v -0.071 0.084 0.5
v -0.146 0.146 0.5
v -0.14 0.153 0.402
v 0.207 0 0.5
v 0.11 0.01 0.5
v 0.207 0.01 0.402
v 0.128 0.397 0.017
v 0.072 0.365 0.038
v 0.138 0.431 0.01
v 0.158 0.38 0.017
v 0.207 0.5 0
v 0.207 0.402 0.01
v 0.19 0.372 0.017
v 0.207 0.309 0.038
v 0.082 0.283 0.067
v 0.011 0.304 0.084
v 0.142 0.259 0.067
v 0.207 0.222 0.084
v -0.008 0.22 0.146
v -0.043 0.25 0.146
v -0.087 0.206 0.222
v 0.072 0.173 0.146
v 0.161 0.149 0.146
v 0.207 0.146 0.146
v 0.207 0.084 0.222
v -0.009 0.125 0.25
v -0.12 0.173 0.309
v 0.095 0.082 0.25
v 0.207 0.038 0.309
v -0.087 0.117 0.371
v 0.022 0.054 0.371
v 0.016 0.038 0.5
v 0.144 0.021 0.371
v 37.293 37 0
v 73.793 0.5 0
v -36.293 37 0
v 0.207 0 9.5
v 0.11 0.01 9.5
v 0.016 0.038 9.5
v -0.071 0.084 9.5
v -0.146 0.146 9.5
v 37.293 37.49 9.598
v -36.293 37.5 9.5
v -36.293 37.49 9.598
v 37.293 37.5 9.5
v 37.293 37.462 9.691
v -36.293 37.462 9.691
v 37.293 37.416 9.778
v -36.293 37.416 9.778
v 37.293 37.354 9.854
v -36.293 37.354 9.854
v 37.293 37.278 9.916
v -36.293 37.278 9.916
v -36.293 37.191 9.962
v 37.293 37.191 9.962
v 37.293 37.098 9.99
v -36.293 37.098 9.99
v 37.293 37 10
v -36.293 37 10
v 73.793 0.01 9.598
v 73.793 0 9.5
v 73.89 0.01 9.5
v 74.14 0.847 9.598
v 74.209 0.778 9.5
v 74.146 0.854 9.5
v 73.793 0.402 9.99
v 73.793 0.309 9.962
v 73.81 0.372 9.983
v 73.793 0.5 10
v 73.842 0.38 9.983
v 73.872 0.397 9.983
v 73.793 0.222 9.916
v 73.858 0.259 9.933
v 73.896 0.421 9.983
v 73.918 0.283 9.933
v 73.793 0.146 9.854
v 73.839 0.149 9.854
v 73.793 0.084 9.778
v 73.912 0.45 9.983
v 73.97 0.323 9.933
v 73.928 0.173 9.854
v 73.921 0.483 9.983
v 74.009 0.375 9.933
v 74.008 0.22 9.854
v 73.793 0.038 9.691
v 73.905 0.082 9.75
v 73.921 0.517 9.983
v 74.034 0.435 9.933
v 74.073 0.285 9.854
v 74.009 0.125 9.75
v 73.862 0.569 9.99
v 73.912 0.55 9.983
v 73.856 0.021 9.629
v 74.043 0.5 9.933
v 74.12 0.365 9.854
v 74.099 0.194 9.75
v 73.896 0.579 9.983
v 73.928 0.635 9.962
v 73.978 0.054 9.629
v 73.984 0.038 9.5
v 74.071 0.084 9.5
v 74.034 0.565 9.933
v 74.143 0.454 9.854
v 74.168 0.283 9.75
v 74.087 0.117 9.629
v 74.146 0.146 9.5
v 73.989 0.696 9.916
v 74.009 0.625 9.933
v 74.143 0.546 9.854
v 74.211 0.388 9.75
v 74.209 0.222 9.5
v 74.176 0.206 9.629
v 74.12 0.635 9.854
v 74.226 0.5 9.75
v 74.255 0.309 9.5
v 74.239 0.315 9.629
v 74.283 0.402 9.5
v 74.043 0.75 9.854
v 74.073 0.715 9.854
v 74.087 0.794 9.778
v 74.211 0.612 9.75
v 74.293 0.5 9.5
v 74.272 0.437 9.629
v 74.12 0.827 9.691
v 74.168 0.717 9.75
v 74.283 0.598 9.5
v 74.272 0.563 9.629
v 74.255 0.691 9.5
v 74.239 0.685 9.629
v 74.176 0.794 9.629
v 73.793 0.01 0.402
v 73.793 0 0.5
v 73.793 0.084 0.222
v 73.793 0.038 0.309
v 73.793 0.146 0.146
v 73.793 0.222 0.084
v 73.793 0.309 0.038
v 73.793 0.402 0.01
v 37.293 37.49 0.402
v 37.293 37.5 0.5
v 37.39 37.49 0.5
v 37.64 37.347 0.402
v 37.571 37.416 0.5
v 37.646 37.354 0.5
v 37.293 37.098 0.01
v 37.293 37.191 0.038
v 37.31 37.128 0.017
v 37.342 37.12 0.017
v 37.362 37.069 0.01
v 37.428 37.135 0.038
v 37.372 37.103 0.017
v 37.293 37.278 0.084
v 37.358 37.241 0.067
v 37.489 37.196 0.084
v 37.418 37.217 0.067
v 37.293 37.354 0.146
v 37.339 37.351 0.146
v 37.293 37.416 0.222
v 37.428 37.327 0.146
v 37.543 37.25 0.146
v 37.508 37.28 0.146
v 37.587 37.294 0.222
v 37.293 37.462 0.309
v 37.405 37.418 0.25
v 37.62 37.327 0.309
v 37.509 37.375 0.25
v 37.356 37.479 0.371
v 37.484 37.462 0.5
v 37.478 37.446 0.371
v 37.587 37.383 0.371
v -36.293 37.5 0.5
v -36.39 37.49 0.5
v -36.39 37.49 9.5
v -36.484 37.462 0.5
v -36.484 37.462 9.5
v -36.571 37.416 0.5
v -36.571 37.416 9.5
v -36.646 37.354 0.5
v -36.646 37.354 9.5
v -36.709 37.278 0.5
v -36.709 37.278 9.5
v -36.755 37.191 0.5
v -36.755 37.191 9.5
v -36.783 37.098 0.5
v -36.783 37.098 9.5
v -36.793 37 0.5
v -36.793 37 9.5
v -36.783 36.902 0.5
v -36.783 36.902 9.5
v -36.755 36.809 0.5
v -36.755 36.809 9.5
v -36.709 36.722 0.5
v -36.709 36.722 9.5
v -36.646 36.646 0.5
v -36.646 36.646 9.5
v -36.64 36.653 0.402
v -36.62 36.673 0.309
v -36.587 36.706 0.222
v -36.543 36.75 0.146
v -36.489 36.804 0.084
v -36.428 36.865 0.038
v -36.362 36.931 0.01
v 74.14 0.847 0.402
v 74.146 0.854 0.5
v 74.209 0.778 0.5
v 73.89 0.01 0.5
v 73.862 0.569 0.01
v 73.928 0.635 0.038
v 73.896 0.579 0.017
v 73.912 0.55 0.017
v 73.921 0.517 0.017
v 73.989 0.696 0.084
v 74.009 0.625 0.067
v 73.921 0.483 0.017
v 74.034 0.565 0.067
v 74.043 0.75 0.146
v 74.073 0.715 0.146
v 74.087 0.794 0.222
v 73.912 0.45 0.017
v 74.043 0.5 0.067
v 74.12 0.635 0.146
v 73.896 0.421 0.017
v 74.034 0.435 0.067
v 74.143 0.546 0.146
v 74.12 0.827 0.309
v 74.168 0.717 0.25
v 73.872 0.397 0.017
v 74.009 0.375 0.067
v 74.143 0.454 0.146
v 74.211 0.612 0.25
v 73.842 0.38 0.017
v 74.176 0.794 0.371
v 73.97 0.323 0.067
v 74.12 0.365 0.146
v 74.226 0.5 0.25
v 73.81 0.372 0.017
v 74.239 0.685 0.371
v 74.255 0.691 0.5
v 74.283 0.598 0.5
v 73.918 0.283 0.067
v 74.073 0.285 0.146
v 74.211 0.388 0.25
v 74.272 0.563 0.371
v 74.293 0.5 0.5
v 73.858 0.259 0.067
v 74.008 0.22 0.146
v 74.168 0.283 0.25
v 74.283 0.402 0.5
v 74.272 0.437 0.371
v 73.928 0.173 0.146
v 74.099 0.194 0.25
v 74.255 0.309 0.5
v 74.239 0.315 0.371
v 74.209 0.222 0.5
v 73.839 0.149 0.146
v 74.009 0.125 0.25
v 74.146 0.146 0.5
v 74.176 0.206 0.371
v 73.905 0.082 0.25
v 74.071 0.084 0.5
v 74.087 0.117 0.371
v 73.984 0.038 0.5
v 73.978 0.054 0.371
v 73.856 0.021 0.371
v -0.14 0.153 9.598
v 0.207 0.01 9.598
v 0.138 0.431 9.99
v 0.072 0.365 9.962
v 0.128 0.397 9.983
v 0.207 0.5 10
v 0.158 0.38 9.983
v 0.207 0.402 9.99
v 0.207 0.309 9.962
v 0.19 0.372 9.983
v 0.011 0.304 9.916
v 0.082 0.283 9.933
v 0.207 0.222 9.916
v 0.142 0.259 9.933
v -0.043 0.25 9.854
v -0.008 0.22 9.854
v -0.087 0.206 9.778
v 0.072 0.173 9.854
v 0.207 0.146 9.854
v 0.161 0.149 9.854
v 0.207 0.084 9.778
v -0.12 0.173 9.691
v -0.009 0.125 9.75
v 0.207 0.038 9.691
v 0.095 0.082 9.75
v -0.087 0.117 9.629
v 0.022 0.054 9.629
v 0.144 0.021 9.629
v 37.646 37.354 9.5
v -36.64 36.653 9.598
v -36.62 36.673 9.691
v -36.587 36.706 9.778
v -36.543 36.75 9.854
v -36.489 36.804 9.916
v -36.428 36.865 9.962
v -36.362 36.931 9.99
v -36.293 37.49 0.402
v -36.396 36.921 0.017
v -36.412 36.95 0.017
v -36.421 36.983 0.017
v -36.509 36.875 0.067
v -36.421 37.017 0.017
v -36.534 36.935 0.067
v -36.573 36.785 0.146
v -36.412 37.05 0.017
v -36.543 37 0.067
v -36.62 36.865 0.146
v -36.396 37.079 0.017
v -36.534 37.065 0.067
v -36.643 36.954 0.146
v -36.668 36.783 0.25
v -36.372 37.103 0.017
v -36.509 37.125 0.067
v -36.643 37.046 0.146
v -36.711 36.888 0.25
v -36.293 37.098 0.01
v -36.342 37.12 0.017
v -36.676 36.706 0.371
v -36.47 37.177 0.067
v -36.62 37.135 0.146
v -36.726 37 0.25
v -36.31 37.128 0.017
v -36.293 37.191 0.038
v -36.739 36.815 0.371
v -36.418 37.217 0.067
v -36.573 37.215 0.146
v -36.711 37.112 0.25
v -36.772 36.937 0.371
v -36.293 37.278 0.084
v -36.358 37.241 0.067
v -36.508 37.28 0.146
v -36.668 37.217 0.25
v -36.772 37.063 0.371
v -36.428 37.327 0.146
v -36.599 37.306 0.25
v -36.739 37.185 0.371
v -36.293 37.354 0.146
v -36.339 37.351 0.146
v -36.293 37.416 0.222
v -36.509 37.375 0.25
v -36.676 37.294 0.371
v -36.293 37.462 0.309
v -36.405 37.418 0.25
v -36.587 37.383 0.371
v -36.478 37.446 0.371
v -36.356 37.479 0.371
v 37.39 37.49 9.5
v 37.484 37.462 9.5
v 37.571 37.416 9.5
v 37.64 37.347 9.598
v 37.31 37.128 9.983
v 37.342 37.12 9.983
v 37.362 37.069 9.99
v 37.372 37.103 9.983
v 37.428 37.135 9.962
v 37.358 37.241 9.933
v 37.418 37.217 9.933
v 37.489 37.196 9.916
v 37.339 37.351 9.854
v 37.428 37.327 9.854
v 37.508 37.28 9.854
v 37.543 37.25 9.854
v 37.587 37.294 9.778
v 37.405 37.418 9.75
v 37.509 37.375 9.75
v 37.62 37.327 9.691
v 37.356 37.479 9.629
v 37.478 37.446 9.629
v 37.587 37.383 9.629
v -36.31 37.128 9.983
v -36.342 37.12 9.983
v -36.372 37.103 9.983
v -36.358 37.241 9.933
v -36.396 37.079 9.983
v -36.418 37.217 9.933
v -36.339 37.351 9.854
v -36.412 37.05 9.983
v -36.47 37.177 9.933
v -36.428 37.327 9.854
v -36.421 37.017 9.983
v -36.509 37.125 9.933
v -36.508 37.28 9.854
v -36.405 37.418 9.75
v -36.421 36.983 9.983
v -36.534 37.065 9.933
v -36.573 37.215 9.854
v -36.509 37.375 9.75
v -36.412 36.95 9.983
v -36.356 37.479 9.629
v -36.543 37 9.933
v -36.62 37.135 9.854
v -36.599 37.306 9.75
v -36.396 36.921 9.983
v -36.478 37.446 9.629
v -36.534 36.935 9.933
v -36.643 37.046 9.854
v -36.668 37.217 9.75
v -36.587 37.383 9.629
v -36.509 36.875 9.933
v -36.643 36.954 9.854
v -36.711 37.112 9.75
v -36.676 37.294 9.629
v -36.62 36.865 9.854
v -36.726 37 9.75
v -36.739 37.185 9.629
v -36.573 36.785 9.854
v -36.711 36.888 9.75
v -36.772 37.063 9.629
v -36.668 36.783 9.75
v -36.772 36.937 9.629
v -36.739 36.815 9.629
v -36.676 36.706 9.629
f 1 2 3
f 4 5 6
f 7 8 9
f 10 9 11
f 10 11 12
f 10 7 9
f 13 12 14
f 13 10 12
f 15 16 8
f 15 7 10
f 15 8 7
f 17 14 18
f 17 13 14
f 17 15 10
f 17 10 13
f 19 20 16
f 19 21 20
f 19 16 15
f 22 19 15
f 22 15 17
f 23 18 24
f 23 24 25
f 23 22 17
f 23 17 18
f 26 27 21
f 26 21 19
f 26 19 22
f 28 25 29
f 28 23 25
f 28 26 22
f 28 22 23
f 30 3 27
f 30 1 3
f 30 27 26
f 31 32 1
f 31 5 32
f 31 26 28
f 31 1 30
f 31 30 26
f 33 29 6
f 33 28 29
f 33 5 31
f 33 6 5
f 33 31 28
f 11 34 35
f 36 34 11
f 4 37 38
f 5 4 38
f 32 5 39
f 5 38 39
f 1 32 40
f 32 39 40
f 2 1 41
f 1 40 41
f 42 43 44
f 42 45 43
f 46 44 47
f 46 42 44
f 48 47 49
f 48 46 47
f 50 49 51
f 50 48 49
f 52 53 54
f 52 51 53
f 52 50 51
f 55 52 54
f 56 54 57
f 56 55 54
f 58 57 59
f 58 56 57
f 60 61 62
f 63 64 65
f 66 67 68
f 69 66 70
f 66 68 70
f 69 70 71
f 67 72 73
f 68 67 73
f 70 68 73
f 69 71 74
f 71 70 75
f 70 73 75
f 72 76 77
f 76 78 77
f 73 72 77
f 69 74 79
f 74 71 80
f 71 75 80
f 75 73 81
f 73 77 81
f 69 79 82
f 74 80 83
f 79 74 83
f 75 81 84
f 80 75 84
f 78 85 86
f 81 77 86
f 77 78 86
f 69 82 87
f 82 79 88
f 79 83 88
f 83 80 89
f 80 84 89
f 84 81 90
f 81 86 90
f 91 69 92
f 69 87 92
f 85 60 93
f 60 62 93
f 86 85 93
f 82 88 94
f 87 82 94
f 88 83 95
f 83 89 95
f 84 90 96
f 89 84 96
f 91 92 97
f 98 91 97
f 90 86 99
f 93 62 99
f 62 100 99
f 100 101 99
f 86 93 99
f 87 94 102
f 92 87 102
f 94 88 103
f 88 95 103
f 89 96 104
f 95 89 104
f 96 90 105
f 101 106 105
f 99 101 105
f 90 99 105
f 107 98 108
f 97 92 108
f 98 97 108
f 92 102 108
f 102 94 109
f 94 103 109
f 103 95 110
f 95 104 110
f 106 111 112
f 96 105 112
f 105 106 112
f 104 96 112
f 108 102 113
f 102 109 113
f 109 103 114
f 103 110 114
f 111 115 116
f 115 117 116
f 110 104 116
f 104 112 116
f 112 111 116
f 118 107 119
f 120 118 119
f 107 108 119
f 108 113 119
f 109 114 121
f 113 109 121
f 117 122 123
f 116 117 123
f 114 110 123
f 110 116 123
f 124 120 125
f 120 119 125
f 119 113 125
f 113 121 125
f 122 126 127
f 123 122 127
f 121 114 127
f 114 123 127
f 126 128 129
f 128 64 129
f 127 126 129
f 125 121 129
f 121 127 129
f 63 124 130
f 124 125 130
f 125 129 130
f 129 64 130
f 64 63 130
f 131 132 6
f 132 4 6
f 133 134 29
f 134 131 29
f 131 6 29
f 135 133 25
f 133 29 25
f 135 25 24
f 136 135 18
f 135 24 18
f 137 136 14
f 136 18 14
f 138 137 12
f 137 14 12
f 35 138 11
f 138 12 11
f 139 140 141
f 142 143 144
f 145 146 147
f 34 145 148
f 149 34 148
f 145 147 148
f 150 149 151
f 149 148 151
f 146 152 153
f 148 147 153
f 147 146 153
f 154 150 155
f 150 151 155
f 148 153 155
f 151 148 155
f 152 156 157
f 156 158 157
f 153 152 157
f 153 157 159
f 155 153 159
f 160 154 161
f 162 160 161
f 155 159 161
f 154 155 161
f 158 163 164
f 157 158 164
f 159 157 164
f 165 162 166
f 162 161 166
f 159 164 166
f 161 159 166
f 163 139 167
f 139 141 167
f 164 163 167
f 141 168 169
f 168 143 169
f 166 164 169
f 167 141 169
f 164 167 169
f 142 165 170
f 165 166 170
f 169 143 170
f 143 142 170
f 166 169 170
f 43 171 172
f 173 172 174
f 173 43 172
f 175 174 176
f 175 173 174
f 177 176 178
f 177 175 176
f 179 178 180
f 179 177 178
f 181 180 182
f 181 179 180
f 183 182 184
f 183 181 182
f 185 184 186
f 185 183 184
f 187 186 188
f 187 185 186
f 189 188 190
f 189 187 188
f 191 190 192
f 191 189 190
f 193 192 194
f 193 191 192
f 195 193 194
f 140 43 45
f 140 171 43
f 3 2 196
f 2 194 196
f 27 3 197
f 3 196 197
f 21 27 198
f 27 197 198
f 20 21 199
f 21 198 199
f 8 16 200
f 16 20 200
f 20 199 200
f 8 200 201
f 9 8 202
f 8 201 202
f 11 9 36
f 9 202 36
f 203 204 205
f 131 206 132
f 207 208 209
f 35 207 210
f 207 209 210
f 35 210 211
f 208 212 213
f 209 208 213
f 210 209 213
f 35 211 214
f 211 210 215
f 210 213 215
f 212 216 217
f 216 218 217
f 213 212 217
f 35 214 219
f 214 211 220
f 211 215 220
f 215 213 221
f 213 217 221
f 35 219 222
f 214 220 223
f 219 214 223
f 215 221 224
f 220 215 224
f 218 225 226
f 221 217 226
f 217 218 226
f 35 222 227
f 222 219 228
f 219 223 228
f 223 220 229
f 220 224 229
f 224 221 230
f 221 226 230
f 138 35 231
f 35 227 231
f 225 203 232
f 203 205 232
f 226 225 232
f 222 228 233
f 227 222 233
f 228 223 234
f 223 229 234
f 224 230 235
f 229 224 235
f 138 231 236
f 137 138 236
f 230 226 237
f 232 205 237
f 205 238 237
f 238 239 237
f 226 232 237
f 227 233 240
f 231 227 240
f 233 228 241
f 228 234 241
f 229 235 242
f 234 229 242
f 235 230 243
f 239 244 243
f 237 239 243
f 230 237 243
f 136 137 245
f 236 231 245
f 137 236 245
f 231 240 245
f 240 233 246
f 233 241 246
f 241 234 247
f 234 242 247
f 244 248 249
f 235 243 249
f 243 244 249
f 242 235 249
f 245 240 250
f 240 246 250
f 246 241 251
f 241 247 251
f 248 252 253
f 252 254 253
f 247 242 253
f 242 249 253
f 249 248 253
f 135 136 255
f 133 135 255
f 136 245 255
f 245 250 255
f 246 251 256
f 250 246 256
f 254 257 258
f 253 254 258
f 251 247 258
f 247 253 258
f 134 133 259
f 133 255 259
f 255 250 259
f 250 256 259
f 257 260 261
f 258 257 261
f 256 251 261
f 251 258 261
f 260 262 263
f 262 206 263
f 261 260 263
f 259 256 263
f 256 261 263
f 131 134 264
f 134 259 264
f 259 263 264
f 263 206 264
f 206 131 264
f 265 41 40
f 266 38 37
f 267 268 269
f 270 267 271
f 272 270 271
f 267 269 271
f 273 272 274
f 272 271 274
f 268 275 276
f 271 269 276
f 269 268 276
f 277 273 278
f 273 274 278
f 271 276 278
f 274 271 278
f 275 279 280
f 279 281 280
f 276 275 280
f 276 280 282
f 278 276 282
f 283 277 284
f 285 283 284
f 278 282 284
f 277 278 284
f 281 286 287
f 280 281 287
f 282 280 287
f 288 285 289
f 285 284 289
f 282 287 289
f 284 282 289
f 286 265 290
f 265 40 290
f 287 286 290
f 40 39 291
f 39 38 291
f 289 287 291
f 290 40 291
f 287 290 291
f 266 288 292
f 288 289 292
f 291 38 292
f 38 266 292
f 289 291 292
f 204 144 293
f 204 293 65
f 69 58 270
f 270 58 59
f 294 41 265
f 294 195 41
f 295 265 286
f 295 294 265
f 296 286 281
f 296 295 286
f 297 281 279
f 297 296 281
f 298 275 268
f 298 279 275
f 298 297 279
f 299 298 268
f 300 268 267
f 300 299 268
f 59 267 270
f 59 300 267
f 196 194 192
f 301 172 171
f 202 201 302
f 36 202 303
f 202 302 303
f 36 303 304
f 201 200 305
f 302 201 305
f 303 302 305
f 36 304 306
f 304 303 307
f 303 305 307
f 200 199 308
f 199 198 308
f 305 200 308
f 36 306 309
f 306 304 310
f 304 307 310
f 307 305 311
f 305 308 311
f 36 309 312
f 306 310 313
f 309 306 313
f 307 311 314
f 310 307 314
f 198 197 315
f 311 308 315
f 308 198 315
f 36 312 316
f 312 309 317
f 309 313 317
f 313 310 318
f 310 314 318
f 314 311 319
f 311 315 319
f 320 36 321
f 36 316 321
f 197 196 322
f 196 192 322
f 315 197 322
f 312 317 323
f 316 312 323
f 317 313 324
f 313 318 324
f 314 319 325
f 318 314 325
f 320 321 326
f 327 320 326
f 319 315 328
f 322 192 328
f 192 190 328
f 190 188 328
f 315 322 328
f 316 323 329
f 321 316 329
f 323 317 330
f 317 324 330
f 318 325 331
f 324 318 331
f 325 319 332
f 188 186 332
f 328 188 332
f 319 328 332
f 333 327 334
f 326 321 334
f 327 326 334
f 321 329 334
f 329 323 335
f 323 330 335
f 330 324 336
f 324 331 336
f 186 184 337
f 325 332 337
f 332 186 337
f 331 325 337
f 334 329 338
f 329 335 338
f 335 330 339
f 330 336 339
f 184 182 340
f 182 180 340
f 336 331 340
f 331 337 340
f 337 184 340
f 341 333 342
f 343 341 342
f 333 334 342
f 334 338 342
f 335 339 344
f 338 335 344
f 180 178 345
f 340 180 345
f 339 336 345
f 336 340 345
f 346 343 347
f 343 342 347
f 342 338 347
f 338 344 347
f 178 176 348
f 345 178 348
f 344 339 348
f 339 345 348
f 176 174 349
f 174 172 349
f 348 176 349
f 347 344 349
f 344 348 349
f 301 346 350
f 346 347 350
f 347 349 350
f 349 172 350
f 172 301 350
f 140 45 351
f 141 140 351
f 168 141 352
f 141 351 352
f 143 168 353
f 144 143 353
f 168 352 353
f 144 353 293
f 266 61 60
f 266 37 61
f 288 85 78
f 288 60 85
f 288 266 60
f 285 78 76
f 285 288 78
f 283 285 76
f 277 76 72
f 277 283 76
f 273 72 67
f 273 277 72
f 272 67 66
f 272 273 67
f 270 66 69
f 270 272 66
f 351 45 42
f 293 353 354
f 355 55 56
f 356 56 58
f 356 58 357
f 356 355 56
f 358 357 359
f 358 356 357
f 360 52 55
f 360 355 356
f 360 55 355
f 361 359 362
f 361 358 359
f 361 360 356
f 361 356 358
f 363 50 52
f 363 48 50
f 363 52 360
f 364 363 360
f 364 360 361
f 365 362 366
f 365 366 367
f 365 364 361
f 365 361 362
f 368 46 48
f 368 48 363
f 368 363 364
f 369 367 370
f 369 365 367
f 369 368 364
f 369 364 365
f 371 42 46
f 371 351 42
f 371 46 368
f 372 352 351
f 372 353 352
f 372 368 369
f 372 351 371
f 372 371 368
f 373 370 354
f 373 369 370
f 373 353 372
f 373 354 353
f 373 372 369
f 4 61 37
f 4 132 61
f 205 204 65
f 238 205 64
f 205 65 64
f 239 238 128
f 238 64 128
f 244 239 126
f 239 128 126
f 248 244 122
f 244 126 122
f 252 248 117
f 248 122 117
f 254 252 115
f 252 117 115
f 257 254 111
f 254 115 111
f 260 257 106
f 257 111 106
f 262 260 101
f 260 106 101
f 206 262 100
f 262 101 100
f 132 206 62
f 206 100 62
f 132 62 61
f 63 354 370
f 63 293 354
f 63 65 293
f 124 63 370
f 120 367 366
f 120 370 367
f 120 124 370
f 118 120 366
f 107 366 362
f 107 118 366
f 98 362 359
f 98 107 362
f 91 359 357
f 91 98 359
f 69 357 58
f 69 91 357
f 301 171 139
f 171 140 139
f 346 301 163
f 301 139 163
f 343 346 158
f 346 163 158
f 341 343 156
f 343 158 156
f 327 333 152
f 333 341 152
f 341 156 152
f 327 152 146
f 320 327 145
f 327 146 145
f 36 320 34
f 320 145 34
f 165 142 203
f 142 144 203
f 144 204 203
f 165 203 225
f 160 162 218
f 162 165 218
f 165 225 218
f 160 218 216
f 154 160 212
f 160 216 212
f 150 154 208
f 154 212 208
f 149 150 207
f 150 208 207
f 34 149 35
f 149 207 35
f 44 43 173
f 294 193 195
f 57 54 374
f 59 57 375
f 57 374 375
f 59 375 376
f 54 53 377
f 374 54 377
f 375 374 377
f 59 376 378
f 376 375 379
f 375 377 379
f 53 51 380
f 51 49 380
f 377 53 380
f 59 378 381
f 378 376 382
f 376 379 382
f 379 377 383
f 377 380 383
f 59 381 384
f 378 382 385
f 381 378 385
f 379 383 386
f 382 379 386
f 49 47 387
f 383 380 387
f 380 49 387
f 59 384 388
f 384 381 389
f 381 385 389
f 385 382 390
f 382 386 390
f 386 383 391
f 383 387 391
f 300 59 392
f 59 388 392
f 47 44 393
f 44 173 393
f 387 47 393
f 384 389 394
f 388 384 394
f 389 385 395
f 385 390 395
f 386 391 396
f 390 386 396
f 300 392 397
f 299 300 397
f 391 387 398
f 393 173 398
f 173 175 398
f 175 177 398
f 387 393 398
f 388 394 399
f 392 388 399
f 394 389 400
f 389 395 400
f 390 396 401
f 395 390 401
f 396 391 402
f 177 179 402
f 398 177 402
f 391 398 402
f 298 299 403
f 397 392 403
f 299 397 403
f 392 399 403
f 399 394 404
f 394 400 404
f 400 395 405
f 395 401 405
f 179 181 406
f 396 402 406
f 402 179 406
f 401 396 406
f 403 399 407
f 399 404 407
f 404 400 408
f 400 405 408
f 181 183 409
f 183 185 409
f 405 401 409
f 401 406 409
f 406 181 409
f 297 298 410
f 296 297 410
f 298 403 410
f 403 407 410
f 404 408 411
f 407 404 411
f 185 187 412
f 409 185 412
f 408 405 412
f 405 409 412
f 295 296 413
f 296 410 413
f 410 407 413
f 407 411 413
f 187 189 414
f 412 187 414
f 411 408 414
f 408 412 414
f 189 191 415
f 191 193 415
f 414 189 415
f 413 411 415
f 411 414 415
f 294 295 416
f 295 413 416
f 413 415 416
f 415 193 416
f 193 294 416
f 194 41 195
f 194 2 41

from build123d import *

# Parameters (mm, degrees)
EXTRUDE_1_DEPTH = 10
FILLET_1_R      = 0.5


with BuildPart() as part:
    # 草图1 → 凸台-拉伸1 (new body)
    with BuildSketch(Plane.XY):
        Polygon((-37.5, 37.5), (37.5, 37.5), (75, 0), (0, 0), align=None)
    extrude(amount=EXTRUDE_1_DEPTH)

    # 圆角1
    fillet_1_edges = [part.edges().sort_by_distance(p)[0] for p in [
        (0, 37.5, 10),
        (-18.75, 18.75, 10),
        (37.5, 0, 10),
        (-18.75, 18.75, 0),
        (0, 37.5, 0),
        (56.25, 18.75, 0),
        (37.5, 0, 0),
        (56.25, 18.75, 10),
        (0, 0, 5),
        (-37.5, 37.5, 5),
        (37.5, 37.5, 5),
        (75, 0, 5),
    ]]
    fillet(fillet_1_edges, radius=FILLET_1_R)


solid = part.part
